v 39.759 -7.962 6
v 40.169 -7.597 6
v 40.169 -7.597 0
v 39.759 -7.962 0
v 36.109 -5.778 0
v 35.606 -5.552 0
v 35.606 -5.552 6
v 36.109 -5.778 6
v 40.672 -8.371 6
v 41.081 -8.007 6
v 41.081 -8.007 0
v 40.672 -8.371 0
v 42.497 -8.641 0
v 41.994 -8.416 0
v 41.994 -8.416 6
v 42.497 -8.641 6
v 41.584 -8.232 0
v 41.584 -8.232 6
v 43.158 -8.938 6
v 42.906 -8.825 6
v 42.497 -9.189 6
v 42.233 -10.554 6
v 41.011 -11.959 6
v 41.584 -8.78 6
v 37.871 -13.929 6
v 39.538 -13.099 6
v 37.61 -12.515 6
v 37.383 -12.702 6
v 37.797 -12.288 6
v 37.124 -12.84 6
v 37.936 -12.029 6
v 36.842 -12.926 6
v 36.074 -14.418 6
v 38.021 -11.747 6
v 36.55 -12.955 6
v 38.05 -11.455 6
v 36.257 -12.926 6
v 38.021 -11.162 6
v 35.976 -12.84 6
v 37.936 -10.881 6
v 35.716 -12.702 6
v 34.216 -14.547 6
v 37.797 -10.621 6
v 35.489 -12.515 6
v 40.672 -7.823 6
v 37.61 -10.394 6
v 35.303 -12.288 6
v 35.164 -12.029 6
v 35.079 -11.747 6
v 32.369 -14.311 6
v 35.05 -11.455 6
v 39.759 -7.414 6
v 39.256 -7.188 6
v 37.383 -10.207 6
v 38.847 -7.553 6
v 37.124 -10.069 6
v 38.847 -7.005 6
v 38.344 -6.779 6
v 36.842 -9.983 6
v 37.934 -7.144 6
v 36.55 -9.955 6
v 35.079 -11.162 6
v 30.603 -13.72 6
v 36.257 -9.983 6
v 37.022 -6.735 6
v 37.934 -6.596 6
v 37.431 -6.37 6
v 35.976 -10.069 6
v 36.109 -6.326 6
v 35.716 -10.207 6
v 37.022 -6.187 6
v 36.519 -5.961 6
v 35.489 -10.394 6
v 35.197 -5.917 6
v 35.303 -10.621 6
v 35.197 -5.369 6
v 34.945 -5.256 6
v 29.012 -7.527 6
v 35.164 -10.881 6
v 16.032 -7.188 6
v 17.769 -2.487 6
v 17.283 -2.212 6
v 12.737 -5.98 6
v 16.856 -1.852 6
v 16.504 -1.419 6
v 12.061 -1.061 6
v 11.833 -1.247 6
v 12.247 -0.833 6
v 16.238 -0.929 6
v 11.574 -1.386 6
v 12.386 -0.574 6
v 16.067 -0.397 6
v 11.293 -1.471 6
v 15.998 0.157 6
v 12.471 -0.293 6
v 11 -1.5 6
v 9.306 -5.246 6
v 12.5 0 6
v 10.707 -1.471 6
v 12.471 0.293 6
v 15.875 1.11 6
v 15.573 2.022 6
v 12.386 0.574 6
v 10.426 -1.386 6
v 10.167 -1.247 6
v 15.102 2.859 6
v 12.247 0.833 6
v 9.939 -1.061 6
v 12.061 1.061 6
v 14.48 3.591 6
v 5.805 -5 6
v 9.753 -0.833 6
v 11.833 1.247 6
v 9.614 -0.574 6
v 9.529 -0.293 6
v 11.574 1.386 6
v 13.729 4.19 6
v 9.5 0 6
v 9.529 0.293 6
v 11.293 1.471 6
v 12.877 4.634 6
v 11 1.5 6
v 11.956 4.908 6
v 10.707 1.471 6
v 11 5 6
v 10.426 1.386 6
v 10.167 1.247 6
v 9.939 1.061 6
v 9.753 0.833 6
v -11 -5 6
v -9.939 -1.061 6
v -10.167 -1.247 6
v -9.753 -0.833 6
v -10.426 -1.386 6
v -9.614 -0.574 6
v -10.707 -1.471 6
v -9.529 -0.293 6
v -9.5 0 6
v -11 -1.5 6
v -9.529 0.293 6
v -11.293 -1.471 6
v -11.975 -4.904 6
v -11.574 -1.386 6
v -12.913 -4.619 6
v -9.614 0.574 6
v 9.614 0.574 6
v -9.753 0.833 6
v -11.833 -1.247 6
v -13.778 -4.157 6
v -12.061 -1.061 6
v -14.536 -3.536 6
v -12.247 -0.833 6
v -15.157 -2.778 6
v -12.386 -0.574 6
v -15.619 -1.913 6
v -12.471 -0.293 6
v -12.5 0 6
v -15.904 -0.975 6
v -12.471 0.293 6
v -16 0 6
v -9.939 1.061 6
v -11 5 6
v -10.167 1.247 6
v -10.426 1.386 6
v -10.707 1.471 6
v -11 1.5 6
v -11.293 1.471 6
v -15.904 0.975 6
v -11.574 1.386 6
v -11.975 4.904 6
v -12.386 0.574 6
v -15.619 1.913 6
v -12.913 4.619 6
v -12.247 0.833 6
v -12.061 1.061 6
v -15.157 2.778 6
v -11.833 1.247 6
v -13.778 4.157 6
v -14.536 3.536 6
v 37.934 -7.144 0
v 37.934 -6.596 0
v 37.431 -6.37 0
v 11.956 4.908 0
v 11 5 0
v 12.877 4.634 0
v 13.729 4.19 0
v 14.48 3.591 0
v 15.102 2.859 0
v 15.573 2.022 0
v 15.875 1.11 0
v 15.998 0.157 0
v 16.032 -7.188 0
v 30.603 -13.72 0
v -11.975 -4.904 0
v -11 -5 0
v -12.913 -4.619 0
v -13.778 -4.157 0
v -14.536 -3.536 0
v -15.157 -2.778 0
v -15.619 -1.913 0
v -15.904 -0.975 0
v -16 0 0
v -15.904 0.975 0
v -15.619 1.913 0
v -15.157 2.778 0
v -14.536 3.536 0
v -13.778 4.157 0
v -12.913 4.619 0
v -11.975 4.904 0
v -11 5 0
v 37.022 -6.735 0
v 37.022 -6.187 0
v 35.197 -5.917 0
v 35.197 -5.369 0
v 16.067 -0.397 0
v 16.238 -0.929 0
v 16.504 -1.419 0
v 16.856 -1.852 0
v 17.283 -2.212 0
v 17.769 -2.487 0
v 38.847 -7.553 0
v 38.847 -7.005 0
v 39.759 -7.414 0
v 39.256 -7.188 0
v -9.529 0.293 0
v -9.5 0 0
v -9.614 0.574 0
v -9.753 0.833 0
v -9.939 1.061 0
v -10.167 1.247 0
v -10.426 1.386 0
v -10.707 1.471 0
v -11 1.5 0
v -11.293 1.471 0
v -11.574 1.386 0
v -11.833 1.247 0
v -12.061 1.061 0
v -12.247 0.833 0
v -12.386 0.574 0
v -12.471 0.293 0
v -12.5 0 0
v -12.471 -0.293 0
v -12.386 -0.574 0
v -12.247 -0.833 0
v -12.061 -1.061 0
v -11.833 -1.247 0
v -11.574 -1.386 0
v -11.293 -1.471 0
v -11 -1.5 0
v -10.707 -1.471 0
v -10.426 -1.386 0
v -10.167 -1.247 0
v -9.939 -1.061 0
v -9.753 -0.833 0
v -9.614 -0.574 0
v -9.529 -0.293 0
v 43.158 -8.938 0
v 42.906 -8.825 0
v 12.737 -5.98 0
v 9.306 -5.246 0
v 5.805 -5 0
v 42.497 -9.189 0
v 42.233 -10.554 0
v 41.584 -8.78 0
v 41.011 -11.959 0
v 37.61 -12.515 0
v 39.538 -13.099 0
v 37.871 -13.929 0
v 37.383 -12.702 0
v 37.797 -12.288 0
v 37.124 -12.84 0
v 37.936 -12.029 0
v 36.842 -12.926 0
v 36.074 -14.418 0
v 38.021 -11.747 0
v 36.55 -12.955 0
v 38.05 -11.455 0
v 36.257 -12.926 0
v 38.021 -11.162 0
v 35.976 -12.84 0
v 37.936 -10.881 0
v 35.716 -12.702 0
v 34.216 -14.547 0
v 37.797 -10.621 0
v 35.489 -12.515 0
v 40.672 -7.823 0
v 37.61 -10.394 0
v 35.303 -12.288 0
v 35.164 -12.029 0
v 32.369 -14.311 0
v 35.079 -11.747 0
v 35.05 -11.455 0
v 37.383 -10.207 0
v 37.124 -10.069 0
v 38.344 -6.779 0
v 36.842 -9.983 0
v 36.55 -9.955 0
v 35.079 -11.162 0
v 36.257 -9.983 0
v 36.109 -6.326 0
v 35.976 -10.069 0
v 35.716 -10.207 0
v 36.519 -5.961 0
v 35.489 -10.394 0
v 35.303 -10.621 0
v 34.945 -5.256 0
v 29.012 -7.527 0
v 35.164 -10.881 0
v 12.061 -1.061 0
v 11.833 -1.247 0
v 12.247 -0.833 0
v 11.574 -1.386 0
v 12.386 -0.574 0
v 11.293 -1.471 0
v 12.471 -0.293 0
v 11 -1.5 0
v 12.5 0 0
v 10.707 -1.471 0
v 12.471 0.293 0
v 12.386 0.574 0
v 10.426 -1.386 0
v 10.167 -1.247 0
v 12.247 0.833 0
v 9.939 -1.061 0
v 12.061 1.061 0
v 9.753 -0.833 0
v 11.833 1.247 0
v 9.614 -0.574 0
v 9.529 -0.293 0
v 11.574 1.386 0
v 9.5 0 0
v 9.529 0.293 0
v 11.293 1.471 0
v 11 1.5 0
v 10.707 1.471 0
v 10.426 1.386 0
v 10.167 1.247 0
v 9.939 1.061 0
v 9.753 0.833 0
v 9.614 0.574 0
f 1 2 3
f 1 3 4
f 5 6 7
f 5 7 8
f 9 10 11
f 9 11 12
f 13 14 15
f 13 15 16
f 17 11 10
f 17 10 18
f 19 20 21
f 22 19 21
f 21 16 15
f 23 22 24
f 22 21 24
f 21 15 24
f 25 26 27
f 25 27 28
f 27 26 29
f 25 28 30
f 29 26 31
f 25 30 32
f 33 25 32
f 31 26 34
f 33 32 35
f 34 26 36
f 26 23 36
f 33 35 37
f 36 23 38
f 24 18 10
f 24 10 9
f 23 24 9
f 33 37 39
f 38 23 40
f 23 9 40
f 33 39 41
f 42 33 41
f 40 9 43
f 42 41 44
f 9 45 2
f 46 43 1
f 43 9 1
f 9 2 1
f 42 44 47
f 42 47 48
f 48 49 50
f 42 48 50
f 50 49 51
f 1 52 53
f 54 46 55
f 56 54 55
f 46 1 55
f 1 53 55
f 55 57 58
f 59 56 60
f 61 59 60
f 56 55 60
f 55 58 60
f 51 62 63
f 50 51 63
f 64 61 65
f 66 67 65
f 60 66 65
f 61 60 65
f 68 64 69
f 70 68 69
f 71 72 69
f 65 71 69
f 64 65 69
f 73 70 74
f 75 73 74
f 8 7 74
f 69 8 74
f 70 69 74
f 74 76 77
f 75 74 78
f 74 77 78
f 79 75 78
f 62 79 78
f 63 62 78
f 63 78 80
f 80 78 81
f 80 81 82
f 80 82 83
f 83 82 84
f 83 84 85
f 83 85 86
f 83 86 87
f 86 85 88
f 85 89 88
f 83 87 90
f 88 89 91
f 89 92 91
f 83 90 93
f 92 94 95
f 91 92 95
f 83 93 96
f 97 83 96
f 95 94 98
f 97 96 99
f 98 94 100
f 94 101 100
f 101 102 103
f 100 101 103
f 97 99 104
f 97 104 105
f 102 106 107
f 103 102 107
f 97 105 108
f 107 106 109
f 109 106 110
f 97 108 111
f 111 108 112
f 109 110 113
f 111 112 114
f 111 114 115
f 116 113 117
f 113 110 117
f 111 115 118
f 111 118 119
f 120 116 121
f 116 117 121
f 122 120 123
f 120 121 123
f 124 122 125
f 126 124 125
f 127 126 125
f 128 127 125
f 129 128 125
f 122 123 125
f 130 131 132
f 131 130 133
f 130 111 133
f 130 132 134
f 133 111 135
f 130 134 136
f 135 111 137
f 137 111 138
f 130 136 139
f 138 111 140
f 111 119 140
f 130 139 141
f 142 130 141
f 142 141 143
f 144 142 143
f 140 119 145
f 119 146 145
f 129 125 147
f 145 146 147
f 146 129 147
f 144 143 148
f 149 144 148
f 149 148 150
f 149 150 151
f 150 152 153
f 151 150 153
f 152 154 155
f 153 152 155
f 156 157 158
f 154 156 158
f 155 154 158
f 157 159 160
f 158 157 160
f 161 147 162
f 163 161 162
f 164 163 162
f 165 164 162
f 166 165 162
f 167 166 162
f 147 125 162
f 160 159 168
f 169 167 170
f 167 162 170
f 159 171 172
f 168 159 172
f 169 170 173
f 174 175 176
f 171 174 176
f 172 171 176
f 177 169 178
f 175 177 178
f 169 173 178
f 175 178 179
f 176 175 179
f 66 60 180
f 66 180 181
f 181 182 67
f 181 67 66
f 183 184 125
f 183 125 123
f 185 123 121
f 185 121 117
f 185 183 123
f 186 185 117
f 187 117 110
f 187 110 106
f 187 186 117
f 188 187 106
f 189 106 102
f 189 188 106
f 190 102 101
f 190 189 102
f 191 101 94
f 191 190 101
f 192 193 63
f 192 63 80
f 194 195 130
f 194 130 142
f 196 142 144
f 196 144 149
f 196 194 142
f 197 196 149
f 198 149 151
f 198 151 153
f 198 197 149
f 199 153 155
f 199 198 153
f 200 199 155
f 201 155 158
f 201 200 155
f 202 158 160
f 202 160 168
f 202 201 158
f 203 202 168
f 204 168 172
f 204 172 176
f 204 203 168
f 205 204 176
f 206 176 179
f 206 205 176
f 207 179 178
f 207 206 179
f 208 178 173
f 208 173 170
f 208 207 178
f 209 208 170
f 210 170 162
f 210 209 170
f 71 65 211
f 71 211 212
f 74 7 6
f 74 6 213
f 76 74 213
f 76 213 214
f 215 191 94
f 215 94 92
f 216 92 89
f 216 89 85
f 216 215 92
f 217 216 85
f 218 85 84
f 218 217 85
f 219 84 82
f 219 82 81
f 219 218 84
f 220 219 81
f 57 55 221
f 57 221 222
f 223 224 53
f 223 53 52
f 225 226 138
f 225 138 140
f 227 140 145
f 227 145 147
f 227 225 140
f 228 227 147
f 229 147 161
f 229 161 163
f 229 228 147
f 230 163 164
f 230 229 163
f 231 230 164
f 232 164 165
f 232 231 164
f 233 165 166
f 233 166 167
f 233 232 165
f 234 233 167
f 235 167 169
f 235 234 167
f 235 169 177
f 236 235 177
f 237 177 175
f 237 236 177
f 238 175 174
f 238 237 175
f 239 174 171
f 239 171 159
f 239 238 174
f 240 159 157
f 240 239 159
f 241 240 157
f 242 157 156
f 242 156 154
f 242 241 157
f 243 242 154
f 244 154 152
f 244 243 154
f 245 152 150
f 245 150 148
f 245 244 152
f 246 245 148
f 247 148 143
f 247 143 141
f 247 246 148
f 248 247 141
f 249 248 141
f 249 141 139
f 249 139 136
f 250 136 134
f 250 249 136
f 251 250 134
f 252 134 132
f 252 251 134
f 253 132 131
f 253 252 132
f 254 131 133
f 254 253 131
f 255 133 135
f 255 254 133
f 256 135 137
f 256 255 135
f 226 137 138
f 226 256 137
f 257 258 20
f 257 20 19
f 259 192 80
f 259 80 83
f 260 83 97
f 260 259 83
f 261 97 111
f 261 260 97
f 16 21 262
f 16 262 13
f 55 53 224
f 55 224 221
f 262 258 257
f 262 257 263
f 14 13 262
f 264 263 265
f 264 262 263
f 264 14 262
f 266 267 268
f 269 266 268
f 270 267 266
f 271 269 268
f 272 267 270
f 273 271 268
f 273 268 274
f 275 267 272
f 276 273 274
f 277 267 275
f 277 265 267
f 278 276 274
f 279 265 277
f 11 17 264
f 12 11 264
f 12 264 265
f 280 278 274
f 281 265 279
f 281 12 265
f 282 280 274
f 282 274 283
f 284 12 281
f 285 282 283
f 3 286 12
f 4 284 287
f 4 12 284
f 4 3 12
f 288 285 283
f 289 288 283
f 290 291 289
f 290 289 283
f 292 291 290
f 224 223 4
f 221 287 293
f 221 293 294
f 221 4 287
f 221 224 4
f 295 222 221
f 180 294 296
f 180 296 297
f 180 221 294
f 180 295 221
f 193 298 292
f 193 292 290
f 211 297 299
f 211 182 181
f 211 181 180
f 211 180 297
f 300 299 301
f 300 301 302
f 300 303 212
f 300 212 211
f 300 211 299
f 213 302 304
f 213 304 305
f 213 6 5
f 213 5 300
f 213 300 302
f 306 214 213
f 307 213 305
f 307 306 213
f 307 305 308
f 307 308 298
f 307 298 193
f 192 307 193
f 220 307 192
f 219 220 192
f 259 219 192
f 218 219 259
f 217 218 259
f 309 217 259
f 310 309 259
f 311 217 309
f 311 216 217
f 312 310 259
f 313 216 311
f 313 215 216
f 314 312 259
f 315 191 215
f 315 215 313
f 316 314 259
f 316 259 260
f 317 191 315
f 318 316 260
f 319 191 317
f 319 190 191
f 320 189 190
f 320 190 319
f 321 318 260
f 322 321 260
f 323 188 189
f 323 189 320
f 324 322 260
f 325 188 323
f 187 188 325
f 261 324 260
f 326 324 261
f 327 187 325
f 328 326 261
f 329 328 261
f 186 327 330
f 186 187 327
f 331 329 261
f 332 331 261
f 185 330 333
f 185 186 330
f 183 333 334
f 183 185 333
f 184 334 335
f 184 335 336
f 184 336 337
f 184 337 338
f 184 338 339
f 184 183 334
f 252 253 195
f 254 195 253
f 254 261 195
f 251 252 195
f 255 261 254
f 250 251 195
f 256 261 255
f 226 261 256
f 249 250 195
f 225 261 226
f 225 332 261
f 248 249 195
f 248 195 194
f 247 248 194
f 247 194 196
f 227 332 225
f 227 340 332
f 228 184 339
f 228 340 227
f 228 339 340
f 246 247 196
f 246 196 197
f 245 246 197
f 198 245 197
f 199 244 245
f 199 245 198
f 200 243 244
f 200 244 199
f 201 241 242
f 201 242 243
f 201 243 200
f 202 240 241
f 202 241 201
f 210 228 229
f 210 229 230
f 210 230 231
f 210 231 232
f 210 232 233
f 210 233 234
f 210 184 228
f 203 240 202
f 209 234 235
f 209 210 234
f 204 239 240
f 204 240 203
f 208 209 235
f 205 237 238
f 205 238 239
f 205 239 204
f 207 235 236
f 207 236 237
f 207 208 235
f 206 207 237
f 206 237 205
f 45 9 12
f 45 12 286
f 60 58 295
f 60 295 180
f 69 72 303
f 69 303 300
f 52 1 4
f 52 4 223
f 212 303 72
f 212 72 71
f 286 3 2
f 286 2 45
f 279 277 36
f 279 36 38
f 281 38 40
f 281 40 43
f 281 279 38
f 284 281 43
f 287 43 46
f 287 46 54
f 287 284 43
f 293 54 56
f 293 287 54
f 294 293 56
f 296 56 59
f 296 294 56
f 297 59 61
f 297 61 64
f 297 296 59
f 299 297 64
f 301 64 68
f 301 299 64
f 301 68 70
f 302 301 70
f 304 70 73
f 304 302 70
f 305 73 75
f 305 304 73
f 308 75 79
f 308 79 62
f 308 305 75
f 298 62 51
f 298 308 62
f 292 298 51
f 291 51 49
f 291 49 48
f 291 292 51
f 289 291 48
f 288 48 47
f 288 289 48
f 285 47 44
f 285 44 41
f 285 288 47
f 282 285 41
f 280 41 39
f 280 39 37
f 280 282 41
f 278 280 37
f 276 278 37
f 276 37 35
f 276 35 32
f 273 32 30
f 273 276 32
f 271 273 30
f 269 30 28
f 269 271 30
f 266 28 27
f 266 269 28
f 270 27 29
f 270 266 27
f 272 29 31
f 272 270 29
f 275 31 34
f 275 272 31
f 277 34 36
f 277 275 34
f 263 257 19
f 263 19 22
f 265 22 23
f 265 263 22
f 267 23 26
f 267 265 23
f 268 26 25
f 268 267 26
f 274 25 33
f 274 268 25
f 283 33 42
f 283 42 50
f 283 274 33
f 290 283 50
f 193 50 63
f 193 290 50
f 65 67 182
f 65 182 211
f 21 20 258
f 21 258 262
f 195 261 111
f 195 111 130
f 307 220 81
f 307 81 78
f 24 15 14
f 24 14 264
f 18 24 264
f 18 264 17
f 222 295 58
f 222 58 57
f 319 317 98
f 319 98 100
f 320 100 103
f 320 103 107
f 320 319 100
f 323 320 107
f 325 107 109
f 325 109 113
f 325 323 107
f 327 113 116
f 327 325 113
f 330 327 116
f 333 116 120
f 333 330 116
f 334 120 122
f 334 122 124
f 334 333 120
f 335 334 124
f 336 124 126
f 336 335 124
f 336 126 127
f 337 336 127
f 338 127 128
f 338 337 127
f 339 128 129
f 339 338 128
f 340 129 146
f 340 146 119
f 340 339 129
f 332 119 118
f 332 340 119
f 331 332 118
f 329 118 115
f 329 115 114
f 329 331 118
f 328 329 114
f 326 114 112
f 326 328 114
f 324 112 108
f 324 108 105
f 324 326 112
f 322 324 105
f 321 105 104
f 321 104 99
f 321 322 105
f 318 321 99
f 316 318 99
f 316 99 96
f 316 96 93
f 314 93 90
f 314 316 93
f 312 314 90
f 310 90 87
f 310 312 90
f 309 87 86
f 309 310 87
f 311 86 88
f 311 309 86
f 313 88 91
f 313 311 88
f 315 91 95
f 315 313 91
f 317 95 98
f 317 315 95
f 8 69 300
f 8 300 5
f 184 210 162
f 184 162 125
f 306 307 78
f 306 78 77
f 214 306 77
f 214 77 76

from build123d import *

# Parameters (mm, degrees)
SKETCH_1_R             = 1.5
EXTRUDE_1_DEPTH        = 6
EXTRUDE_START          = -6
SKETCH_2_R             = 1.5
EXTRUDE_2_DEPTH        = 6
CUT_EXTRUDE_1_DEPTH    = 6
PATTERN_LINEAR_1_COUNT = 9
PATTERN_LINEAR_1_PITCH = 1


with BuildPart() as part:
    # 草图1 → 凸台-拉伸1 (new body)
    with BuildSketch(Plane.XY):
        with BuildLine():
            Line((-11, 5), (11, 5))
            ThreePointArc((11, 5), (16, 0), (11, -5))
            Line((11, -5), (-11, -5))
            ThreePointArc((-11, -5), (-16, 0), (-11, 5))
        make_face()
        with Locations((-11, 0)):
            Circle(SKETCH_1_R, mode=Mode.SUBTRACT)
        with Locations((11, 0)):
            Circle(SKETCH_1_R, mode=Mode.SUBTRACT)
    extrude(amount=EXTRUDE_1_DEPTH)

    # 草图2 → 凸台-拉伸2 (add)
    with BuildSketch(Plane.XY.offset(6).offset(EXTRUDE_START)):
        with BuildLine():
            Line((17.768794041, -2.486649801), (29.011601927, -7.527047167))
            Line((29.011601927, -7.527047167), (34.945301709, -5.255713659))
            Line((34.945301709, -5.255713659), (43.157744395, -8.937531841))
            ThreePointArc((43.157744395, -8.937531841), (37.870669943, -13.928931417), (30.602691257, -13.719857707))
            Line((30.602691257, -13.719857707), (16.032361282, -7.187659205))
            ThreePointArc((16.032361282, -7.187659205), (11.034404004, -5.553031682), (5.805088555, -5))
            Line((5.805088555, -5), (11, -5))
            ThreePointArc((11, -5), (14.590532493, -3.479666135), (15.99754173, 0.156769434))
            ThreePointArc((15.99754173, 0.156769434), (16.503827213, -1.419121599), (17.768794041, -2.486649801))
        make_face()
        with Locations((36.549821691, -11.454545455)):
            Circle(SKETCH_2_R, mode=Mode.SUBTRACT)
    extrude(amount=EXTRUDE_2_DEPTH)

    # 草图3 → 切除-拉伸1 (cut)
    with BuildSketch(Plane.XY.offset(6)):
        Polygon((42.906043034, -8.8246886), (42.496952125, -9.189233202), (42.496952125, -8.641284173), align=None)
    cut_extrude_1 = extrude(amount=-CUT_EXTRUDE_1_DEPTH, mode=Mode.SUBTRACT)

    # 阵列(线性)1: 切除-拉伸1 ×9
    with Locations(*[Vector(-0.9124936318129422, 0.4090909090909094, 0) * (i * PATTERN_LINEAR_1_PITCH) for i in range(1, PATTERN_LINEAR_1_COUNT)]):
        add(cut_extrude_1, mode=Mode.SUBTRACT)


solid = part.part
